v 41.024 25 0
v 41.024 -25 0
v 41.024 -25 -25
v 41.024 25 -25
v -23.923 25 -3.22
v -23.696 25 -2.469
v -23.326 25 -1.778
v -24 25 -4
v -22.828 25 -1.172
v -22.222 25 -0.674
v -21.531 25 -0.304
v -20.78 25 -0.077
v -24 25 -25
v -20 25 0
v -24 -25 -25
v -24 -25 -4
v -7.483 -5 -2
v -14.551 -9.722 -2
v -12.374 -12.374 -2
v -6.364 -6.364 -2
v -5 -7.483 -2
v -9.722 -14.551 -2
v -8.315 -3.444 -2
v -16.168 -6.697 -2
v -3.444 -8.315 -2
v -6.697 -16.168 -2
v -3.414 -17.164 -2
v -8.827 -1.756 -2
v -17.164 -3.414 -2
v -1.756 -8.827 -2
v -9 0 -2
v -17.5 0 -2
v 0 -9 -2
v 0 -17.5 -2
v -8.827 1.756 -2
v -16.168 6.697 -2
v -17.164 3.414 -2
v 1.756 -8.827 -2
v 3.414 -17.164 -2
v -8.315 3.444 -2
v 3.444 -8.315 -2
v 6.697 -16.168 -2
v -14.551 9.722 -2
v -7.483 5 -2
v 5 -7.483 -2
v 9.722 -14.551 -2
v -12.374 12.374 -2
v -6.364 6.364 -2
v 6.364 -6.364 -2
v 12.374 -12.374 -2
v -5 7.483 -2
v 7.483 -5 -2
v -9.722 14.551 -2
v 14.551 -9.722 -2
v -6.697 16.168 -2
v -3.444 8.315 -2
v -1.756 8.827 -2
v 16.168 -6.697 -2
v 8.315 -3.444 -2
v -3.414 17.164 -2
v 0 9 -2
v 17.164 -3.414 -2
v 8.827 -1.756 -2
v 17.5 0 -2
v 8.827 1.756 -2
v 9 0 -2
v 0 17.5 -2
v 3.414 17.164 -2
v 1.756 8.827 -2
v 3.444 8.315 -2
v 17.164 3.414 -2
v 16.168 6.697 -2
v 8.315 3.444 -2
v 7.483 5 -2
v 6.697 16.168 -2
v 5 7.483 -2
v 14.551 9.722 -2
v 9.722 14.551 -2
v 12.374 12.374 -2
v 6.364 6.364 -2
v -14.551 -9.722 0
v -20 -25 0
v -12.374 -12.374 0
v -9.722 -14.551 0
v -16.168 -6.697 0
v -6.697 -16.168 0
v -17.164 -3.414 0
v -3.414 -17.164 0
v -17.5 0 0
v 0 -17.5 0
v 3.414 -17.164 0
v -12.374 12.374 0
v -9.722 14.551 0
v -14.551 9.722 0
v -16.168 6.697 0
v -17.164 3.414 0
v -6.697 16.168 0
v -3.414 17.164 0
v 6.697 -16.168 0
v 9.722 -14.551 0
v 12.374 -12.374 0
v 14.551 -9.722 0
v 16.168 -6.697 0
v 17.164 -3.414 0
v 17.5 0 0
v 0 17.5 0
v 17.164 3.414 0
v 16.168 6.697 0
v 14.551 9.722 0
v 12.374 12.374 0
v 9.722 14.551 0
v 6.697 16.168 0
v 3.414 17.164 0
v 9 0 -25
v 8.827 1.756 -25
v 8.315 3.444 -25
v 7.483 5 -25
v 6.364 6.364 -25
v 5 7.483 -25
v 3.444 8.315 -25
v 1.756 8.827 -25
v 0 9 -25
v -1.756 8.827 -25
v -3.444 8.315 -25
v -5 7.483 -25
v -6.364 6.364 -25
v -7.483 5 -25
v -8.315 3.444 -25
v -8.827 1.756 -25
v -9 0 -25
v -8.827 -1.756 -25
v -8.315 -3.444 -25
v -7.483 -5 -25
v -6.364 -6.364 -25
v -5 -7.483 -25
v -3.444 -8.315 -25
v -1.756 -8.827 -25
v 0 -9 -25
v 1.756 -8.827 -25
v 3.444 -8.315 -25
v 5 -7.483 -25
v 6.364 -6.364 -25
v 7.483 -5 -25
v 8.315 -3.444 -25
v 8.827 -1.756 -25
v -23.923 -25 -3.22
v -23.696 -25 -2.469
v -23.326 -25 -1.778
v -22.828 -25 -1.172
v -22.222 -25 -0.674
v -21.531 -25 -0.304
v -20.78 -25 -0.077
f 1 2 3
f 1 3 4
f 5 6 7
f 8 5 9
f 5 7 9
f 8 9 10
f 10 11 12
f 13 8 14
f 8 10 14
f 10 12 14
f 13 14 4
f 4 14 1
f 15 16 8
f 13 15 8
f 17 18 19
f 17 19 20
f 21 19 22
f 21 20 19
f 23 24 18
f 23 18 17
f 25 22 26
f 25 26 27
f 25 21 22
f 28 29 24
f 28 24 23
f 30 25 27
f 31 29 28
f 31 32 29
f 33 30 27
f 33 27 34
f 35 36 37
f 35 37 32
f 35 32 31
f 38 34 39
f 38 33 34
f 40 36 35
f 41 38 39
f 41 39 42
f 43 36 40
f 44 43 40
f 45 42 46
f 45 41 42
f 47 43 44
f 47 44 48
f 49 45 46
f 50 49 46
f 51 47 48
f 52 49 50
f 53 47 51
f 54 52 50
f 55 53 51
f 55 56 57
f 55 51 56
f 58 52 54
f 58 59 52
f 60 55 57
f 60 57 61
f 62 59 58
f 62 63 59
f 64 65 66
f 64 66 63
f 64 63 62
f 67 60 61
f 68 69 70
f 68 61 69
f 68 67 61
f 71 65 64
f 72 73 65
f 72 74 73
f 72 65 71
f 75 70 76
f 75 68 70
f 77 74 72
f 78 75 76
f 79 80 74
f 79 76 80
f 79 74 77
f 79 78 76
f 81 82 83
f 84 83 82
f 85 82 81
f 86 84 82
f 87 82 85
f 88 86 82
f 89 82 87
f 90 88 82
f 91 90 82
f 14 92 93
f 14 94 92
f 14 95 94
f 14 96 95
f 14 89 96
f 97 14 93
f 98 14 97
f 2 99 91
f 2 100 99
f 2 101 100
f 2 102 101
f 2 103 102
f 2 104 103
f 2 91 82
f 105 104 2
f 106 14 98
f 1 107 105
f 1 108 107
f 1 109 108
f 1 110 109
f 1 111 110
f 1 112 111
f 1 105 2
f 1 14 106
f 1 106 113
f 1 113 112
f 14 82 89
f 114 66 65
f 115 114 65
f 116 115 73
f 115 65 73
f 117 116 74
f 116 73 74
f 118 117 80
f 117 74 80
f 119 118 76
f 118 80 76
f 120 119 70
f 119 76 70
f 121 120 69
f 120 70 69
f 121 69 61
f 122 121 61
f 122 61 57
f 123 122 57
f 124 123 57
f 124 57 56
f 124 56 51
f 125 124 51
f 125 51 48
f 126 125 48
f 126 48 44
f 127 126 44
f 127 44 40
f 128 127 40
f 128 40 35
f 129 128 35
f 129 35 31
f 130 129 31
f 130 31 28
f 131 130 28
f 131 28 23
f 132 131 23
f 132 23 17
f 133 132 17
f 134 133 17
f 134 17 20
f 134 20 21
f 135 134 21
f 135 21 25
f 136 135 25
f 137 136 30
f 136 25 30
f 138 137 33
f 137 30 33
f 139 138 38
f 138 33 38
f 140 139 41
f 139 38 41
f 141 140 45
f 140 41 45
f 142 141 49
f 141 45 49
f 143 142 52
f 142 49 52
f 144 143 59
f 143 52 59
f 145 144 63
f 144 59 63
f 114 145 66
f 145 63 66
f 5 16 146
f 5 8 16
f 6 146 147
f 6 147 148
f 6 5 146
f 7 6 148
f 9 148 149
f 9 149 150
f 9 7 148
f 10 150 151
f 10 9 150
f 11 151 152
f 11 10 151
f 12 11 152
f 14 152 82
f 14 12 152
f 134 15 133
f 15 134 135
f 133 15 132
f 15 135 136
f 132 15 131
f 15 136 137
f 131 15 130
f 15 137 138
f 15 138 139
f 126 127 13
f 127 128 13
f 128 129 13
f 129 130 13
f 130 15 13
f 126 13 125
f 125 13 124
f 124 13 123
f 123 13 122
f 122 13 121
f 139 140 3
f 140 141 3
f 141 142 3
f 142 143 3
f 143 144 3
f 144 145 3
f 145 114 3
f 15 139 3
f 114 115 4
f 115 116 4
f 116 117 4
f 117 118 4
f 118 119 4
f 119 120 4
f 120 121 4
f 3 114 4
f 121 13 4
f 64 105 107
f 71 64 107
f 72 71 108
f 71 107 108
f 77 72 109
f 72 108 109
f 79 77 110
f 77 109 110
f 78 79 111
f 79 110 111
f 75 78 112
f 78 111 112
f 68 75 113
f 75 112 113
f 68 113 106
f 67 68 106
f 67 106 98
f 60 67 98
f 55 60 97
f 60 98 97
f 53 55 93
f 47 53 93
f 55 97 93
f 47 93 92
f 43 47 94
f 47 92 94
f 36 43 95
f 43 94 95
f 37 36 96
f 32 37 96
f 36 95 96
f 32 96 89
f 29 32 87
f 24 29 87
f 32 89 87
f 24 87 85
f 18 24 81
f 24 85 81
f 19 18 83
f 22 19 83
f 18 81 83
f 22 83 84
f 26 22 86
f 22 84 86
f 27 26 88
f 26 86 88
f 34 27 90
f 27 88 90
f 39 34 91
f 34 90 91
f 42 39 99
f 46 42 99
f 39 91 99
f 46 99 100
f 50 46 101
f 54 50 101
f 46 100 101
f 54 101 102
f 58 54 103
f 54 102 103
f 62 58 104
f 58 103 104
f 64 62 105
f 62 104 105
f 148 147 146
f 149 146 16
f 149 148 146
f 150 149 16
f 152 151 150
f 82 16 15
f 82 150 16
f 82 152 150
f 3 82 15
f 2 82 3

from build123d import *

# Parameters (mm, degrees)
F0_W     = 65.023827
F0_H     = 50
F1_DEPTH = 25
F2_R     = 9
F3_DEPTH = 25.001
F4_R     = 17.5
F5_DEPTH = 2
F6_R     = 4


with BuildPart() as f1:
    # F0 (on Top) → F1 (new body)
    with BuildSketch(Plane.XY):
        with Locations((8.511913, 0)):
            Rectangle(F0_W, F0_H)
    extrude(amount=-F1_DEPTH)

    # F2 (on face) → F3 (cut, through all)
    with BuildSketch(Plane.XY):
        Circle(F2_R)
    extrude(amount=-F3_DEPTH, mode=Mode.SUBTRACT)

    # F4 (on face) → F5 (cut)
    with BuildSketch(Plane.XY):
        Circle(F4_R)
    extrude(amount=-F5_DEPTH, mode=Mode.SUBTRACT)

    # F6
    f6_edges = [f1.edges().sort_by_distance(p)[0] for p in [
        (-24, 0, 0),
    ]]
    fillet(f6_edges, radius=F6_R)


solid = f1.part
